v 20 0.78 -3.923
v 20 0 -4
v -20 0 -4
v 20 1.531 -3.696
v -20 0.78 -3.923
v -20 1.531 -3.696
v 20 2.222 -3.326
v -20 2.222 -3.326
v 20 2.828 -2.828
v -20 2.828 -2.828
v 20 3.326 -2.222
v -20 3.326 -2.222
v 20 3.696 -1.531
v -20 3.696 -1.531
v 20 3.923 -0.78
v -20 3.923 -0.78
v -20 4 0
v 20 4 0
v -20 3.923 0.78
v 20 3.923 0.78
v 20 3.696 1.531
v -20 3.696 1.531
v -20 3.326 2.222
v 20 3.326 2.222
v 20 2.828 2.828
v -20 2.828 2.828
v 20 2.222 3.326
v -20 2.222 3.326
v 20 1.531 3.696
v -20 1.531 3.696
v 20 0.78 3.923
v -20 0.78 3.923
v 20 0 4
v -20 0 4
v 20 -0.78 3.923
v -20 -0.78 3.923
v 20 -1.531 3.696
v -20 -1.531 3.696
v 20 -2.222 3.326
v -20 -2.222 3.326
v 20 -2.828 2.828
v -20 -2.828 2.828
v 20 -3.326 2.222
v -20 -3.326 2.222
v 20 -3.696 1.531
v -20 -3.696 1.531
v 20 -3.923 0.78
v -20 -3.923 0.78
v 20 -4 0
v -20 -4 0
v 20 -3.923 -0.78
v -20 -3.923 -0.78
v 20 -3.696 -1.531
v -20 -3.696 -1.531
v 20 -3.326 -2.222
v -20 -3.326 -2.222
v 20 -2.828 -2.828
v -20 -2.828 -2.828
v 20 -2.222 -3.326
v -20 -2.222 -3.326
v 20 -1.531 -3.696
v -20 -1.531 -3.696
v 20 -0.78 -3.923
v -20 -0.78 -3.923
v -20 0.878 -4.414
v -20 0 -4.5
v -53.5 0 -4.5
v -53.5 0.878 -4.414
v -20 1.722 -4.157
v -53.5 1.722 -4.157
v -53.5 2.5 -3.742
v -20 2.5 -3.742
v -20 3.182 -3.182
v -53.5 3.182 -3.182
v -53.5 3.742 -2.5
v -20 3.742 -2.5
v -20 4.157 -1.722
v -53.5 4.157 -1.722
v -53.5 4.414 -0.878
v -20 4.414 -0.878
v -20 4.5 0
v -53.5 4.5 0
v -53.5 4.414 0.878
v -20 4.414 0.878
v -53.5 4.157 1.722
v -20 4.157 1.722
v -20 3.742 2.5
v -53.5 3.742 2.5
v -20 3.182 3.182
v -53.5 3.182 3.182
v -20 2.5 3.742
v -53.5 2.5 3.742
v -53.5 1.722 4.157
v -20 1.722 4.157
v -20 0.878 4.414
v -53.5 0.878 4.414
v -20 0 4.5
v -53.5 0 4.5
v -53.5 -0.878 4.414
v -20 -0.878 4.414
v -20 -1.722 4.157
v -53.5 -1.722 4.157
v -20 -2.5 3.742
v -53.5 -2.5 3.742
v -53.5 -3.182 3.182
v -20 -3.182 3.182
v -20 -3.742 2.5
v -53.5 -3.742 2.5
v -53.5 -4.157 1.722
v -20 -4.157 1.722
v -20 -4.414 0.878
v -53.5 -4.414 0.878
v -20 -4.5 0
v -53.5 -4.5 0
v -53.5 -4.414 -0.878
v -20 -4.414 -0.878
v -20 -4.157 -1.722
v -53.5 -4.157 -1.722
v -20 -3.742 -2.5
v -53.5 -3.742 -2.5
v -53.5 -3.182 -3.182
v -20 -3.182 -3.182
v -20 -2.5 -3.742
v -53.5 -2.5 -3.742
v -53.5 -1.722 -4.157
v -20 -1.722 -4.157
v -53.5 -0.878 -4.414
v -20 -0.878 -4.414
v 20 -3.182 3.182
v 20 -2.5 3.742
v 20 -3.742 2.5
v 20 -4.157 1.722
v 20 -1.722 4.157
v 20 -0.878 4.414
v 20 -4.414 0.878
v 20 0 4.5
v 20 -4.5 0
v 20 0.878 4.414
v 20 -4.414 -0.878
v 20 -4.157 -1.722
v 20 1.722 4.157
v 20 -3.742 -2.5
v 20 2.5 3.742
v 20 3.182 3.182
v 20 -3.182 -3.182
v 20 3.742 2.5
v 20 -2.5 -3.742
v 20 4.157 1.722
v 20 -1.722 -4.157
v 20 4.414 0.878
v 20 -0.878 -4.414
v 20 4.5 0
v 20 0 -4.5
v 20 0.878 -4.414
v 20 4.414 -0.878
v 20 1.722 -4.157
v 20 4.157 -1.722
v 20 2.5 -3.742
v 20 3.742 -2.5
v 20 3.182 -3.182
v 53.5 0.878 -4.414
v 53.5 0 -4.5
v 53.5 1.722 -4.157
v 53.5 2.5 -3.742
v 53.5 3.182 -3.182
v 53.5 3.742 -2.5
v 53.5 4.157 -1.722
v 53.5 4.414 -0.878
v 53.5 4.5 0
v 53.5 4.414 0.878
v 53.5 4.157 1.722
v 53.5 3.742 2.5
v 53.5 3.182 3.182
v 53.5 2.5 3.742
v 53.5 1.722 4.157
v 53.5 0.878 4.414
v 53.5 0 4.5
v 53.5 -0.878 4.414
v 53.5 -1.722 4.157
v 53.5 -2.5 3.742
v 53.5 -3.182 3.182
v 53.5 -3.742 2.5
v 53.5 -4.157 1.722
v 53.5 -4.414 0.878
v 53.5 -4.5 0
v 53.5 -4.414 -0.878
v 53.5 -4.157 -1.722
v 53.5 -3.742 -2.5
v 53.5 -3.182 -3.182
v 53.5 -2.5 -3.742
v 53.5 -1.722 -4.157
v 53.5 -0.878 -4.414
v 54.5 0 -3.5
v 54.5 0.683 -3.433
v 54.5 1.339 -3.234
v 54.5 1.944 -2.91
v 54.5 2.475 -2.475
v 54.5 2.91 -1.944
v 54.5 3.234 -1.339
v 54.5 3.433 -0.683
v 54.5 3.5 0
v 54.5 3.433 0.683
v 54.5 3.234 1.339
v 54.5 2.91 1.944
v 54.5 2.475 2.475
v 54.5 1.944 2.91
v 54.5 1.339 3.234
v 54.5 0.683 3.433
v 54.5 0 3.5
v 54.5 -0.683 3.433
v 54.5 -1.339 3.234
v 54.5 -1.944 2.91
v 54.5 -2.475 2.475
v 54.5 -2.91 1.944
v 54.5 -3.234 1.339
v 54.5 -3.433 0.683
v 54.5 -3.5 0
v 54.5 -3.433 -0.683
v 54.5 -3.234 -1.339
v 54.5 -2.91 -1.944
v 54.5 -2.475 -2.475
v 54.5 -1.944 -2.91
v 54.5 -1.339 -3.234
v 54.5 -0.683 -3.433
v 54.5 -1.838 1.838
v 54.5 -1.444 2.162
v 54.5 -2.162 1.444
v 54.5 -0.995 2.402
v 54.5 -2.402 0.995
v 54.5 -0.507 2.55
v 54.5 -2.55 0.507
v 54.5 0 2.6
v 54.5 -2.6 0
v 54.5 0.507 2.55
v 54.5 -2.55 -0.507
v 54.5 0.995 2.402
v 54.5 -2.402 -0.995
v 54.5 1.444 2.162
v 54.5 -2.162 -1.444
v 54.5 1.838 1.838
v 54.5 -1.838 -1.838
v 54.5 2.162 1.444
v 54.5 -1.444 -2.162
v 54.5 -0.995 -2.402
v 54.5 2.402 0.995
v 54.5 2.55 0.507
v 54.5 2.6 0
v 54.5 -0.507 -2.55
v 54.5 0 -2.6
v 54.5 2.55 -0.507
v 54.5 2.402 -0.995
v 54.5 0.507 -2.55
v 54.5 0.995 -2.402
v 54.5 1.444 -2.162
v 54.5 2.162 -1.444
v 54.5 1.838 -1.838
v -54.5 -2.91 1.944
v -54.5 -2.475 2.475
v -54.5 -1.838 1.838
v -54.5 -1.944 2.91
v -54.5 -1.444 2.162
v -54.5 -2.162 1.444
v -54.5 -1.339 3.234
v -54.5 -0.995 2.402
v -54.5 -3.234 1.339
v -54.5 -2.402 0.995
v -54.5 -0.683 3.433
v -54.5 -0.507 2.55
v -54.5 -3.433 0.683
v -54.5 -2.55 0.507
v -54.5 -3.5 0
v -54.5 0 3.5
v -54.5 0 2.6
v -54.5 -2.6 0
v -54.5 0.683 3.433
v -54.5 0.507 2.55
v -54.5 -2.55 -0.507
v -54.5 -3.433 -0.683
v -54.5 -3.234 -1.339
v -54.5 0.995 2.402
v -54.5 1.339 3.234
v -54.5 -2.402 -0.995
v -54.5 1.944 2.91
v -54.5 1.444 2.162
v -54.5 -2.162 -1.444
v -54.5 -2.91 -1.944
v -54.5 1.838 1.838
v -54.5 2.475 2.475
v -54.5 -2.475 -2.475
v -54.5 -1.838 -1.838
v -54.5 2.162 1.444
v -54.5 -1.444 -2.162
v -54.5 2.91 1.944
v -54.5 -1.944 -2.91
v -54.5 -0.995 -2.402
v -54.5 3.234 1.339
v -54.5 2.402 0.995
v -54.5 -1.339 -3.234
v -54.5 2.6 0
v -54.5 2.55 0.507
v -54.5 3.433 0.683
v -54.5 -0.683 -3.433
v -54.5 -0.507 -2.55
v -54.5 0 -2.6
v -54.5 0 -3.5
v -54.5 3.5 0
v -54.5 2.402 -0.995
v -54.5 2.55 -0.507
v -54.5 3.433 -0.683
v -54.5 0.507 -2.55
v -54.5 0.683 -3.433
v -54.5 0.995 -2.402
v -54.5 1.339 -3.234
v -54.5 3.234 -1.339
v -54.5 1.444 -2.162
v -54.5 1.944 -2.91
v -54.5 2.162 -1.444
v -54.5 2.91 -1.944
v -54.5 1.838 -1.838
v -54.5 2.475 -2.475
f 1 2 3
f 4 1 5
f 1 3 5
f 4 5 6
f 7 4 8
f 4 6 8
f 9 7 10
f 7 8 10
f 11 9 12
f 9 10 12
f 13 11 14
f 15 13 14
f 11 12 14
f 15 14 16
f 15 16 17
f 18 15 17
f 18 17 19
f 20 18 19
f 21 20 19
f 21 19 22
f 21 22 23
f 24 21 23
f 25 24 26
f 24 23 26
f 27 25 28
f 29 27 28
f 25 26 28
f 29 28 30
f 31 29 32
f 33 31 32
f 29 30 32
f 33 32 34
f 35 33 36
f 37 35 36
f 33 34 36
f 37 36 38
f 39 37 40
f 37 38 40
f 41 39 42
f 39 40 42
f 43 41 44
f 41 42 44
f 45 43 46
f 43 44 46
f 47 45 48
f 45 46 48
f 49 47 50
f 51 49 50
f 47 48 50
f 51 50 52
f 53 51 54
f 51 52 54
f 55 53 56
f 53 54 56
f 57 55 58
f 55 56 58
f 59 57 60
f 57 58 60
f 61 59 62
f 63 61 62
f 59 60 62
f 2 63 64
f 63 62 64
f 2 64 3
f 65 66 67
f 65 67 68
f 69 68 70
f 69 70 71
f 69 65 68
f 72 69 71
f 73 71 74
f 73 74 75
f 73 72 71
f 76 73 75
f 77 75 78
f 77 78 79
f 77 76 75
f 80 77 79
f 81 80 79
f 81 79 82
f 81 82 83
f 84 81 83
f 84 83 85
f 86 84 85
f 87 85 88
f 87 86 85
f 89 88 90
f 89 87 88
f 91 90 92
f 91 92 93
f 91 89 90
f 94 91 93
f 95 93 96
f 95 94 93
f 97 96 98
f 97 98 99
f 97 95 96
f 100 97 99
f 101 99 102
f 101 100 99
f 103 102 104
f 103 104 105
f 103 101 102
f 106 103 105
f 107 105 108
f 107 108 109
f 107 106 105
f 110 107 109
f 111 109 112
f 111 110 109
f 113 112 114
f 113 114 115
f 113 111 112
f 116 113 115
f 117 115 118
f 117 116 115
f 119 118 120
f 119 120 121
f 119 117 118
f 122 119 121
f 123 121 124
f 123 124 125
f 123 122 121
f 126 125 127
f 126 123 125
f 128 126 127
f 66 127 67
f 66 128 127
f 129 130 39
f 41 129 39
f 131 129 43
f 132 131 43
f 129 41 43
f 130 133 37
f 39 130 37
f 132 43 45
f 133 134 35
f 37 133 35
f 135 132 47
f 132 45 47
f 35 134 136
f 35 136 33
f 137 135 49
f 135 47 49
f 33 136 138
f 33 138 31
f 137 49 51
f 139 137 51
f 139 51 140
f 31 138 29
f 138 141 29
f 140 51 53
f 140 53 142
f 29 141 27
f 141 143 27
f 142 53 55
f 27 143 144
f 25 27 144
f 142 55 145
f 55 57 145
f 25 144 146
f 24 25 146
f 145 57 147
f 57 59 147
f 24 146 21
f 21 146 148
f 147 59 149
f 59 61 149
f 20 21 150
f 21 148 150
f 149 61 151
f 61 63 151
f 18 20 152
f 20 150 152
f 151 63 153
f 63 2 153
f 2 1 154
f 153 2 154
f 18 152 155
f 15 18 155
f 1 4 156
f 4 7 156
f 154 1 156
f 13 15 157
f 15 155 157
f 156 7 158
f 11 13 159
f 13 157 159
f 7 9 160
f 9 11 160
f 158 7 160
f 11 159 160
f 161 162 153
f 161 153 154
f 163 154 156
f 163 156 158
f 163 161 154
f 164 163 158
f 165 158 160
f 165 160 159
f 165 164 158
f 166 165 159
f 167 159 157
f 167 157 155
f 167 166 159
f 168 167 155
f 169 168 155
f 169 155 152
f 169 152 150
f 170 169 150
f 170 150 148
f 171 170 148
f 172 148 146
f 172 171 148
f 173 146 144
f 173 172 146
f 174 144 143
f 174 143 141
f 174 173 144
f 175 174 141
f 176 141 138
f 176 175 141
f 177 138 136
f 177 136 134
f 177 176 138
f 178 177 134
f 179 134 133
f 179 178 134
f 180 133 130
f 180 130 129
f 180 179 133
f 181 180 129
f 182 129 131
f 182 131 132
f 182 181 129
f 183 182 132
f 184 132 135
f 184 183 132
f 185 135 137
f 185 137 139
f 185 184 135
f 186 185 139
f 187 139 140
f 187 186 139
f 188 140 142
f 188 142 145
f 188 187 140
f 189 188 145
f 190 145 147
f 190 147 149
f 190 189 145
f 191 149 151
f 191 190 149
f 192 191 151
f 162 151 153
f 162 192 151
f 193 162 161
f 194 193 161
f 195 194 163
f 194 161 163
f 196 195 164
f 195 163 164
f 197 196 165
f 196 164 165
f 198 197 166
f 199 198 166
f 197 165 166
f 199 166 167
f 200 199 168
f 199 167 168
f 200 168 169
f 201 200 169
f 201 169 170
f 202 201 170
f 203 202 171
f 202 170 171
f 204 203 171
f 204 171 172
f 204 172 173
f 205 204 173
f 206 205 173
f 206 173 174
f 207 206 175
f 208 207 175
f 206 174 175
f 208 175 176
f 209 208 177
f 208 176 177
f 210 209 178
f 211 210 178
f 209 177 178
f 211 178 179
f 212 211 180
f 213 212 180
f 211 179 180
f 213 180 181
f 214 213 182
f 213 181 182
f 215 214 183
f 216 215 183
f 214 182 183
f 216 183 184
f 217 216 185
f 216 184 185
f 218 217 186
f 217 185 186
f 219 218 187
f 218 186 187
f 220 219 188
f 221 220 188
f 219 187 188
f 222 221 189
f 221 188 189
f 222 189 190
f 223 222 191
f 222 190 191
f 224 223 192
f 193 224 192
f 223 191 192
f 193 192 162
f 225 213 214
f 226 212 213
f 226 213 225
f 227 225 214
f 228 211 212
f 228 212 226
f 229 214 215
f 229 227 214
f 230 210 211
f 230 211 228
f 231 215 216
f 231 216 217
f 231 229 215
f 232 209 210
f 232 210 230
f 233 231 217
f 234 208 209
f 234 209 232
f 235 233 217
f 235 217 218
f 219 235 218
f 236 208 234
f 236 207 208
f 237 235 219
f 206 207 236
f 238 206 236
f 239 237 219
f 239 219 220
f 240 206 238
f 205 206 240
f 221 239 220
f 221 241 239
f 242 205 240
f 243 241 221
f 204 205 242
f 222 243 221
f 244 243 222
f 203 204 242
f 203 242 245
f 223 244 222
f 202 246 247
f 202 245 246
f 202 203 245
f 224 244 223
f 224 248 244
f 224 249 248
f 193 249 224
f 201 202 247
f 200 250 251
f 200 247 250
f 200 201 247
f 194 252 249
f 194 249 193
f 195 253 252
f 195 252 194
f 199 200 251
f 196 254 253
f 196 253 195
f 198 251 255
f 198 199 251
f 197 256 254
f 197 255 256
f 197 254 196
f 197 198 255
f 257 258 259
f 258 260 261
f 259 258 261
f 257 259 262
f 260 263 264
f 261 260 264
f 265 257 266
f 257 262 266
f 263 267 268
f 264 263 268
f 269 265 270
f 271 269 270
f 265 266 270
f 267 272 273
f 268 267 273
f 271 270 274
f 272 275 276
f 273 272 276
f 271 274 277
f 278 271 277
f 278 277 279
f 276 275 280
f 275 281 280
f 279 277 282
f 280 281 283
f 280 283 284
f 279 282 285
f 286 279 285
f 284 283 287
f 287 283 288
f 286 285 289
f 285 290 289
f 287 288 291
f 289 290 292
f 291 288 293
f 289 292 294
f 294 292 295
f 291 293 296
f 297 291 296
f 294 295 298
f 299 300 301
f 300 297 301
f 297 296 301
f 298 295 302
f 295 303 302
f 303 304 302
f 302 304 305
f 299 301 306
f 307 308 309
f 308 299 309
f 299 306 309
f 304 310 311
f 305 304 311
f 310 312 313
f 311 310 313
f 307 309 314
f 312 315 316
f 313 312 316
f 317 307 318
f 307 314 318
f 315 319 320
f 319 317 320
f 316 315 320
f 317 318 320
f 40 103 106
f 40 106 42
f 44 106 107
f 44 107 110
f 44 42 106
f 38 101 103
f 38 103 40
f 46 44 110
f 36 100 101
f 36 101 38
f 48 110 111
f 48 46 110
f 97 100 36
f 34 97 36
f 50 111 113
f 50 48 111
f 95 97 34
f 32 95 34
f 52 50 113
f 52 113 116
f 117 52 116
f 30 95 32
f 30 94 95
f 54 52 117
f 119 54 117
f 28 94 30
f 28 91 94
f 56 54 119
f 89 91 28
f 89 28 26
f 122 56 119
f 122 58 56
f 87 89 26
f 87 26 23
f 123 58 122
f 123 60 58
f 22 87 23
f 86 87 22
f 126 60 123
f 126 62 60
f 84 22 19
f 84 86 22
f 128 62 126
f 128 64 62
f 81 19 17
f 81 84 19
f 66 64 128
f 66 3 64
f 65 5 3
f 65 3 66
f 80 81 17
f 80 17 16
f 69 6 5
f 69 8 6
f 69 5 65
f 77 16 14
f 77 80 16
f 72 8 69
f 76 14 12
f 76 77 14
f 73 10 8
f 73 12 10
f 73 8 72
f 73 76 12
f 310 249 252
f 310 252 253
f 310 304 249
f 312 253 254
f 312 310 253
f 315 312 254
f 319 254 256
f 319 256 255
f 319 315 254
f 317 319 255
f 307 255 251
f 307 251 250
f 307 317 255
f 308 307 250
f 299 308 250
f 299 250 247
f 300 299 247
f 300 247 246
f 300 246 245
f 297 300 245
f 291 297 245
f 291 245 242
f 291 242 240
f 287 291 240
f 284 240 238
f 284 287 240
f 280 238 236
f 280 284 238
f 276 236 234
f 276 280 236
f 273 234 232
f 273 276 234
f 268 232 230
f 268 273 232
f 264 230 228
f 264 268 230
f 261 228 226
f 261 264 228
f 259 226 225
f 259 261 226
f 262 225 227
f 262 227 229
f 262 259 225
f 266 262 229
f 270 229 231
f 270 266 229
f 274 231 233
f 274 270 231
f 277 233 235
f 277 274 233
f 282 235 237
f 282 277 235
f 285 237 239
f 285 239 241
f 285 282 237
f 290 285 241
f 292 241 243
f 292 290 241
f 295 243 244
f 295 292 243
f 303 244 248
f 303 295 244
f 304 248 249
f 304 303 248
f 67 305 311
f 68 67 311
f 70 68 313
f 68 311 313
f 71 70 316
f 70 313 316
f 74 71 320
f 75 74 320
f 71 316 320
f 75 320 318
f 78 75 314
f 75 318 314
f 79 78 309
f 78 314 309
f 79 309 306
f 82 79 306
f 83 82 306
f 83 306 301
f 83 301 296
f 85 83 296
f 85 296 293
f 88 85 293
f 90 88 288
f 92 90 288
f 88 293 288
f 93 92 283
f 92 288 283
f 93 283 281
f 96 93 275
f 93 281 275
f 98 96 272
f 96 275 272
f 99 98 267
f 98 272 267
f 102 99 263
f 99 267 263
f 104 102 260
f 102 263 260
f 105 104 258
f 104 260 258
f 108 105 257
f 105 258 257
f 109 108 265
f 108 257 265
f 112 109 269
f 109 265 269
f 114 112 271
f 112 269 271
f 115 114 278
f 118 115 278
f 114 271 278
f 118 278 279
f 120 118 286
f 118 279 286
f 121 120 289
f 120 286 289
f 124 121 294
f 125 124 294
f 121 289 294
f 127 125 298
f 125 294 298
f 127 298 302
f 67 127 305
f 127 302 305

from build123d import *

# Parameters (mm, degrees)
ESQUISSE1_R             = 4.5
ESQUISSE1_R_2           = 2.6
EXTRUSION1_DEPTH        = 54.5
ESQUISSE2_OUTSIDE_W     = 32.948
ESQUISSE2_OUTSIDE_H     = 32.948
ESQUISSE2_OUTSIDE_R     = 4
ENL_V_MAT_EXTRU_1_DEPTH = 20
CHANFREIN1_SIZE         = 1


with BuildPart() as part:
    # Esquisse1 → Extrusion1 (new body, symmetric)
    with BuildSketch(Plane(origin=(0, 0, 0), x_dir=(0, 0, -1), z_dir=(1, 0, 0))):
        Circle(ESQUISSE1_R)
        Circle(ESQUISSE1_R_2, mode=Mode.SUBTRACT)
    extrude(amount=EXTRUSION1_DEPTH, both=True)

    # Esquisse2 outside → Enlèv. mat.-Extru.1 (cut, symmetric)
    with BuildSketch(Plane(origin=(0, 0, 0), x_dir=(0, 0, -1), z_dir=(1, 0, 0))):
        Rectangle(ESQUISSE2_OUTSIDE_W, ESQUISSE2_OUTSIDE_H)
        Circle(ESQUISSE2_OUTSIDE_R, mode=Mode.SUBTRACT)
    extrude(amount=ENL_V_MAT_EXTRU_1_DEPTH, both=True, mode=Mode.SUBTRACT)

    # Chanfrein1
    chanfrein1_edges = [part.edges().sort_by_distance(p)[0] for p in [
        (-54.5, 0, 4.5),
        (54.5, 0, 4.5),
    ]]
    chamfer(chanfrein1_edges, length=CHANFREIN1_SIZE)


solid = part.part
